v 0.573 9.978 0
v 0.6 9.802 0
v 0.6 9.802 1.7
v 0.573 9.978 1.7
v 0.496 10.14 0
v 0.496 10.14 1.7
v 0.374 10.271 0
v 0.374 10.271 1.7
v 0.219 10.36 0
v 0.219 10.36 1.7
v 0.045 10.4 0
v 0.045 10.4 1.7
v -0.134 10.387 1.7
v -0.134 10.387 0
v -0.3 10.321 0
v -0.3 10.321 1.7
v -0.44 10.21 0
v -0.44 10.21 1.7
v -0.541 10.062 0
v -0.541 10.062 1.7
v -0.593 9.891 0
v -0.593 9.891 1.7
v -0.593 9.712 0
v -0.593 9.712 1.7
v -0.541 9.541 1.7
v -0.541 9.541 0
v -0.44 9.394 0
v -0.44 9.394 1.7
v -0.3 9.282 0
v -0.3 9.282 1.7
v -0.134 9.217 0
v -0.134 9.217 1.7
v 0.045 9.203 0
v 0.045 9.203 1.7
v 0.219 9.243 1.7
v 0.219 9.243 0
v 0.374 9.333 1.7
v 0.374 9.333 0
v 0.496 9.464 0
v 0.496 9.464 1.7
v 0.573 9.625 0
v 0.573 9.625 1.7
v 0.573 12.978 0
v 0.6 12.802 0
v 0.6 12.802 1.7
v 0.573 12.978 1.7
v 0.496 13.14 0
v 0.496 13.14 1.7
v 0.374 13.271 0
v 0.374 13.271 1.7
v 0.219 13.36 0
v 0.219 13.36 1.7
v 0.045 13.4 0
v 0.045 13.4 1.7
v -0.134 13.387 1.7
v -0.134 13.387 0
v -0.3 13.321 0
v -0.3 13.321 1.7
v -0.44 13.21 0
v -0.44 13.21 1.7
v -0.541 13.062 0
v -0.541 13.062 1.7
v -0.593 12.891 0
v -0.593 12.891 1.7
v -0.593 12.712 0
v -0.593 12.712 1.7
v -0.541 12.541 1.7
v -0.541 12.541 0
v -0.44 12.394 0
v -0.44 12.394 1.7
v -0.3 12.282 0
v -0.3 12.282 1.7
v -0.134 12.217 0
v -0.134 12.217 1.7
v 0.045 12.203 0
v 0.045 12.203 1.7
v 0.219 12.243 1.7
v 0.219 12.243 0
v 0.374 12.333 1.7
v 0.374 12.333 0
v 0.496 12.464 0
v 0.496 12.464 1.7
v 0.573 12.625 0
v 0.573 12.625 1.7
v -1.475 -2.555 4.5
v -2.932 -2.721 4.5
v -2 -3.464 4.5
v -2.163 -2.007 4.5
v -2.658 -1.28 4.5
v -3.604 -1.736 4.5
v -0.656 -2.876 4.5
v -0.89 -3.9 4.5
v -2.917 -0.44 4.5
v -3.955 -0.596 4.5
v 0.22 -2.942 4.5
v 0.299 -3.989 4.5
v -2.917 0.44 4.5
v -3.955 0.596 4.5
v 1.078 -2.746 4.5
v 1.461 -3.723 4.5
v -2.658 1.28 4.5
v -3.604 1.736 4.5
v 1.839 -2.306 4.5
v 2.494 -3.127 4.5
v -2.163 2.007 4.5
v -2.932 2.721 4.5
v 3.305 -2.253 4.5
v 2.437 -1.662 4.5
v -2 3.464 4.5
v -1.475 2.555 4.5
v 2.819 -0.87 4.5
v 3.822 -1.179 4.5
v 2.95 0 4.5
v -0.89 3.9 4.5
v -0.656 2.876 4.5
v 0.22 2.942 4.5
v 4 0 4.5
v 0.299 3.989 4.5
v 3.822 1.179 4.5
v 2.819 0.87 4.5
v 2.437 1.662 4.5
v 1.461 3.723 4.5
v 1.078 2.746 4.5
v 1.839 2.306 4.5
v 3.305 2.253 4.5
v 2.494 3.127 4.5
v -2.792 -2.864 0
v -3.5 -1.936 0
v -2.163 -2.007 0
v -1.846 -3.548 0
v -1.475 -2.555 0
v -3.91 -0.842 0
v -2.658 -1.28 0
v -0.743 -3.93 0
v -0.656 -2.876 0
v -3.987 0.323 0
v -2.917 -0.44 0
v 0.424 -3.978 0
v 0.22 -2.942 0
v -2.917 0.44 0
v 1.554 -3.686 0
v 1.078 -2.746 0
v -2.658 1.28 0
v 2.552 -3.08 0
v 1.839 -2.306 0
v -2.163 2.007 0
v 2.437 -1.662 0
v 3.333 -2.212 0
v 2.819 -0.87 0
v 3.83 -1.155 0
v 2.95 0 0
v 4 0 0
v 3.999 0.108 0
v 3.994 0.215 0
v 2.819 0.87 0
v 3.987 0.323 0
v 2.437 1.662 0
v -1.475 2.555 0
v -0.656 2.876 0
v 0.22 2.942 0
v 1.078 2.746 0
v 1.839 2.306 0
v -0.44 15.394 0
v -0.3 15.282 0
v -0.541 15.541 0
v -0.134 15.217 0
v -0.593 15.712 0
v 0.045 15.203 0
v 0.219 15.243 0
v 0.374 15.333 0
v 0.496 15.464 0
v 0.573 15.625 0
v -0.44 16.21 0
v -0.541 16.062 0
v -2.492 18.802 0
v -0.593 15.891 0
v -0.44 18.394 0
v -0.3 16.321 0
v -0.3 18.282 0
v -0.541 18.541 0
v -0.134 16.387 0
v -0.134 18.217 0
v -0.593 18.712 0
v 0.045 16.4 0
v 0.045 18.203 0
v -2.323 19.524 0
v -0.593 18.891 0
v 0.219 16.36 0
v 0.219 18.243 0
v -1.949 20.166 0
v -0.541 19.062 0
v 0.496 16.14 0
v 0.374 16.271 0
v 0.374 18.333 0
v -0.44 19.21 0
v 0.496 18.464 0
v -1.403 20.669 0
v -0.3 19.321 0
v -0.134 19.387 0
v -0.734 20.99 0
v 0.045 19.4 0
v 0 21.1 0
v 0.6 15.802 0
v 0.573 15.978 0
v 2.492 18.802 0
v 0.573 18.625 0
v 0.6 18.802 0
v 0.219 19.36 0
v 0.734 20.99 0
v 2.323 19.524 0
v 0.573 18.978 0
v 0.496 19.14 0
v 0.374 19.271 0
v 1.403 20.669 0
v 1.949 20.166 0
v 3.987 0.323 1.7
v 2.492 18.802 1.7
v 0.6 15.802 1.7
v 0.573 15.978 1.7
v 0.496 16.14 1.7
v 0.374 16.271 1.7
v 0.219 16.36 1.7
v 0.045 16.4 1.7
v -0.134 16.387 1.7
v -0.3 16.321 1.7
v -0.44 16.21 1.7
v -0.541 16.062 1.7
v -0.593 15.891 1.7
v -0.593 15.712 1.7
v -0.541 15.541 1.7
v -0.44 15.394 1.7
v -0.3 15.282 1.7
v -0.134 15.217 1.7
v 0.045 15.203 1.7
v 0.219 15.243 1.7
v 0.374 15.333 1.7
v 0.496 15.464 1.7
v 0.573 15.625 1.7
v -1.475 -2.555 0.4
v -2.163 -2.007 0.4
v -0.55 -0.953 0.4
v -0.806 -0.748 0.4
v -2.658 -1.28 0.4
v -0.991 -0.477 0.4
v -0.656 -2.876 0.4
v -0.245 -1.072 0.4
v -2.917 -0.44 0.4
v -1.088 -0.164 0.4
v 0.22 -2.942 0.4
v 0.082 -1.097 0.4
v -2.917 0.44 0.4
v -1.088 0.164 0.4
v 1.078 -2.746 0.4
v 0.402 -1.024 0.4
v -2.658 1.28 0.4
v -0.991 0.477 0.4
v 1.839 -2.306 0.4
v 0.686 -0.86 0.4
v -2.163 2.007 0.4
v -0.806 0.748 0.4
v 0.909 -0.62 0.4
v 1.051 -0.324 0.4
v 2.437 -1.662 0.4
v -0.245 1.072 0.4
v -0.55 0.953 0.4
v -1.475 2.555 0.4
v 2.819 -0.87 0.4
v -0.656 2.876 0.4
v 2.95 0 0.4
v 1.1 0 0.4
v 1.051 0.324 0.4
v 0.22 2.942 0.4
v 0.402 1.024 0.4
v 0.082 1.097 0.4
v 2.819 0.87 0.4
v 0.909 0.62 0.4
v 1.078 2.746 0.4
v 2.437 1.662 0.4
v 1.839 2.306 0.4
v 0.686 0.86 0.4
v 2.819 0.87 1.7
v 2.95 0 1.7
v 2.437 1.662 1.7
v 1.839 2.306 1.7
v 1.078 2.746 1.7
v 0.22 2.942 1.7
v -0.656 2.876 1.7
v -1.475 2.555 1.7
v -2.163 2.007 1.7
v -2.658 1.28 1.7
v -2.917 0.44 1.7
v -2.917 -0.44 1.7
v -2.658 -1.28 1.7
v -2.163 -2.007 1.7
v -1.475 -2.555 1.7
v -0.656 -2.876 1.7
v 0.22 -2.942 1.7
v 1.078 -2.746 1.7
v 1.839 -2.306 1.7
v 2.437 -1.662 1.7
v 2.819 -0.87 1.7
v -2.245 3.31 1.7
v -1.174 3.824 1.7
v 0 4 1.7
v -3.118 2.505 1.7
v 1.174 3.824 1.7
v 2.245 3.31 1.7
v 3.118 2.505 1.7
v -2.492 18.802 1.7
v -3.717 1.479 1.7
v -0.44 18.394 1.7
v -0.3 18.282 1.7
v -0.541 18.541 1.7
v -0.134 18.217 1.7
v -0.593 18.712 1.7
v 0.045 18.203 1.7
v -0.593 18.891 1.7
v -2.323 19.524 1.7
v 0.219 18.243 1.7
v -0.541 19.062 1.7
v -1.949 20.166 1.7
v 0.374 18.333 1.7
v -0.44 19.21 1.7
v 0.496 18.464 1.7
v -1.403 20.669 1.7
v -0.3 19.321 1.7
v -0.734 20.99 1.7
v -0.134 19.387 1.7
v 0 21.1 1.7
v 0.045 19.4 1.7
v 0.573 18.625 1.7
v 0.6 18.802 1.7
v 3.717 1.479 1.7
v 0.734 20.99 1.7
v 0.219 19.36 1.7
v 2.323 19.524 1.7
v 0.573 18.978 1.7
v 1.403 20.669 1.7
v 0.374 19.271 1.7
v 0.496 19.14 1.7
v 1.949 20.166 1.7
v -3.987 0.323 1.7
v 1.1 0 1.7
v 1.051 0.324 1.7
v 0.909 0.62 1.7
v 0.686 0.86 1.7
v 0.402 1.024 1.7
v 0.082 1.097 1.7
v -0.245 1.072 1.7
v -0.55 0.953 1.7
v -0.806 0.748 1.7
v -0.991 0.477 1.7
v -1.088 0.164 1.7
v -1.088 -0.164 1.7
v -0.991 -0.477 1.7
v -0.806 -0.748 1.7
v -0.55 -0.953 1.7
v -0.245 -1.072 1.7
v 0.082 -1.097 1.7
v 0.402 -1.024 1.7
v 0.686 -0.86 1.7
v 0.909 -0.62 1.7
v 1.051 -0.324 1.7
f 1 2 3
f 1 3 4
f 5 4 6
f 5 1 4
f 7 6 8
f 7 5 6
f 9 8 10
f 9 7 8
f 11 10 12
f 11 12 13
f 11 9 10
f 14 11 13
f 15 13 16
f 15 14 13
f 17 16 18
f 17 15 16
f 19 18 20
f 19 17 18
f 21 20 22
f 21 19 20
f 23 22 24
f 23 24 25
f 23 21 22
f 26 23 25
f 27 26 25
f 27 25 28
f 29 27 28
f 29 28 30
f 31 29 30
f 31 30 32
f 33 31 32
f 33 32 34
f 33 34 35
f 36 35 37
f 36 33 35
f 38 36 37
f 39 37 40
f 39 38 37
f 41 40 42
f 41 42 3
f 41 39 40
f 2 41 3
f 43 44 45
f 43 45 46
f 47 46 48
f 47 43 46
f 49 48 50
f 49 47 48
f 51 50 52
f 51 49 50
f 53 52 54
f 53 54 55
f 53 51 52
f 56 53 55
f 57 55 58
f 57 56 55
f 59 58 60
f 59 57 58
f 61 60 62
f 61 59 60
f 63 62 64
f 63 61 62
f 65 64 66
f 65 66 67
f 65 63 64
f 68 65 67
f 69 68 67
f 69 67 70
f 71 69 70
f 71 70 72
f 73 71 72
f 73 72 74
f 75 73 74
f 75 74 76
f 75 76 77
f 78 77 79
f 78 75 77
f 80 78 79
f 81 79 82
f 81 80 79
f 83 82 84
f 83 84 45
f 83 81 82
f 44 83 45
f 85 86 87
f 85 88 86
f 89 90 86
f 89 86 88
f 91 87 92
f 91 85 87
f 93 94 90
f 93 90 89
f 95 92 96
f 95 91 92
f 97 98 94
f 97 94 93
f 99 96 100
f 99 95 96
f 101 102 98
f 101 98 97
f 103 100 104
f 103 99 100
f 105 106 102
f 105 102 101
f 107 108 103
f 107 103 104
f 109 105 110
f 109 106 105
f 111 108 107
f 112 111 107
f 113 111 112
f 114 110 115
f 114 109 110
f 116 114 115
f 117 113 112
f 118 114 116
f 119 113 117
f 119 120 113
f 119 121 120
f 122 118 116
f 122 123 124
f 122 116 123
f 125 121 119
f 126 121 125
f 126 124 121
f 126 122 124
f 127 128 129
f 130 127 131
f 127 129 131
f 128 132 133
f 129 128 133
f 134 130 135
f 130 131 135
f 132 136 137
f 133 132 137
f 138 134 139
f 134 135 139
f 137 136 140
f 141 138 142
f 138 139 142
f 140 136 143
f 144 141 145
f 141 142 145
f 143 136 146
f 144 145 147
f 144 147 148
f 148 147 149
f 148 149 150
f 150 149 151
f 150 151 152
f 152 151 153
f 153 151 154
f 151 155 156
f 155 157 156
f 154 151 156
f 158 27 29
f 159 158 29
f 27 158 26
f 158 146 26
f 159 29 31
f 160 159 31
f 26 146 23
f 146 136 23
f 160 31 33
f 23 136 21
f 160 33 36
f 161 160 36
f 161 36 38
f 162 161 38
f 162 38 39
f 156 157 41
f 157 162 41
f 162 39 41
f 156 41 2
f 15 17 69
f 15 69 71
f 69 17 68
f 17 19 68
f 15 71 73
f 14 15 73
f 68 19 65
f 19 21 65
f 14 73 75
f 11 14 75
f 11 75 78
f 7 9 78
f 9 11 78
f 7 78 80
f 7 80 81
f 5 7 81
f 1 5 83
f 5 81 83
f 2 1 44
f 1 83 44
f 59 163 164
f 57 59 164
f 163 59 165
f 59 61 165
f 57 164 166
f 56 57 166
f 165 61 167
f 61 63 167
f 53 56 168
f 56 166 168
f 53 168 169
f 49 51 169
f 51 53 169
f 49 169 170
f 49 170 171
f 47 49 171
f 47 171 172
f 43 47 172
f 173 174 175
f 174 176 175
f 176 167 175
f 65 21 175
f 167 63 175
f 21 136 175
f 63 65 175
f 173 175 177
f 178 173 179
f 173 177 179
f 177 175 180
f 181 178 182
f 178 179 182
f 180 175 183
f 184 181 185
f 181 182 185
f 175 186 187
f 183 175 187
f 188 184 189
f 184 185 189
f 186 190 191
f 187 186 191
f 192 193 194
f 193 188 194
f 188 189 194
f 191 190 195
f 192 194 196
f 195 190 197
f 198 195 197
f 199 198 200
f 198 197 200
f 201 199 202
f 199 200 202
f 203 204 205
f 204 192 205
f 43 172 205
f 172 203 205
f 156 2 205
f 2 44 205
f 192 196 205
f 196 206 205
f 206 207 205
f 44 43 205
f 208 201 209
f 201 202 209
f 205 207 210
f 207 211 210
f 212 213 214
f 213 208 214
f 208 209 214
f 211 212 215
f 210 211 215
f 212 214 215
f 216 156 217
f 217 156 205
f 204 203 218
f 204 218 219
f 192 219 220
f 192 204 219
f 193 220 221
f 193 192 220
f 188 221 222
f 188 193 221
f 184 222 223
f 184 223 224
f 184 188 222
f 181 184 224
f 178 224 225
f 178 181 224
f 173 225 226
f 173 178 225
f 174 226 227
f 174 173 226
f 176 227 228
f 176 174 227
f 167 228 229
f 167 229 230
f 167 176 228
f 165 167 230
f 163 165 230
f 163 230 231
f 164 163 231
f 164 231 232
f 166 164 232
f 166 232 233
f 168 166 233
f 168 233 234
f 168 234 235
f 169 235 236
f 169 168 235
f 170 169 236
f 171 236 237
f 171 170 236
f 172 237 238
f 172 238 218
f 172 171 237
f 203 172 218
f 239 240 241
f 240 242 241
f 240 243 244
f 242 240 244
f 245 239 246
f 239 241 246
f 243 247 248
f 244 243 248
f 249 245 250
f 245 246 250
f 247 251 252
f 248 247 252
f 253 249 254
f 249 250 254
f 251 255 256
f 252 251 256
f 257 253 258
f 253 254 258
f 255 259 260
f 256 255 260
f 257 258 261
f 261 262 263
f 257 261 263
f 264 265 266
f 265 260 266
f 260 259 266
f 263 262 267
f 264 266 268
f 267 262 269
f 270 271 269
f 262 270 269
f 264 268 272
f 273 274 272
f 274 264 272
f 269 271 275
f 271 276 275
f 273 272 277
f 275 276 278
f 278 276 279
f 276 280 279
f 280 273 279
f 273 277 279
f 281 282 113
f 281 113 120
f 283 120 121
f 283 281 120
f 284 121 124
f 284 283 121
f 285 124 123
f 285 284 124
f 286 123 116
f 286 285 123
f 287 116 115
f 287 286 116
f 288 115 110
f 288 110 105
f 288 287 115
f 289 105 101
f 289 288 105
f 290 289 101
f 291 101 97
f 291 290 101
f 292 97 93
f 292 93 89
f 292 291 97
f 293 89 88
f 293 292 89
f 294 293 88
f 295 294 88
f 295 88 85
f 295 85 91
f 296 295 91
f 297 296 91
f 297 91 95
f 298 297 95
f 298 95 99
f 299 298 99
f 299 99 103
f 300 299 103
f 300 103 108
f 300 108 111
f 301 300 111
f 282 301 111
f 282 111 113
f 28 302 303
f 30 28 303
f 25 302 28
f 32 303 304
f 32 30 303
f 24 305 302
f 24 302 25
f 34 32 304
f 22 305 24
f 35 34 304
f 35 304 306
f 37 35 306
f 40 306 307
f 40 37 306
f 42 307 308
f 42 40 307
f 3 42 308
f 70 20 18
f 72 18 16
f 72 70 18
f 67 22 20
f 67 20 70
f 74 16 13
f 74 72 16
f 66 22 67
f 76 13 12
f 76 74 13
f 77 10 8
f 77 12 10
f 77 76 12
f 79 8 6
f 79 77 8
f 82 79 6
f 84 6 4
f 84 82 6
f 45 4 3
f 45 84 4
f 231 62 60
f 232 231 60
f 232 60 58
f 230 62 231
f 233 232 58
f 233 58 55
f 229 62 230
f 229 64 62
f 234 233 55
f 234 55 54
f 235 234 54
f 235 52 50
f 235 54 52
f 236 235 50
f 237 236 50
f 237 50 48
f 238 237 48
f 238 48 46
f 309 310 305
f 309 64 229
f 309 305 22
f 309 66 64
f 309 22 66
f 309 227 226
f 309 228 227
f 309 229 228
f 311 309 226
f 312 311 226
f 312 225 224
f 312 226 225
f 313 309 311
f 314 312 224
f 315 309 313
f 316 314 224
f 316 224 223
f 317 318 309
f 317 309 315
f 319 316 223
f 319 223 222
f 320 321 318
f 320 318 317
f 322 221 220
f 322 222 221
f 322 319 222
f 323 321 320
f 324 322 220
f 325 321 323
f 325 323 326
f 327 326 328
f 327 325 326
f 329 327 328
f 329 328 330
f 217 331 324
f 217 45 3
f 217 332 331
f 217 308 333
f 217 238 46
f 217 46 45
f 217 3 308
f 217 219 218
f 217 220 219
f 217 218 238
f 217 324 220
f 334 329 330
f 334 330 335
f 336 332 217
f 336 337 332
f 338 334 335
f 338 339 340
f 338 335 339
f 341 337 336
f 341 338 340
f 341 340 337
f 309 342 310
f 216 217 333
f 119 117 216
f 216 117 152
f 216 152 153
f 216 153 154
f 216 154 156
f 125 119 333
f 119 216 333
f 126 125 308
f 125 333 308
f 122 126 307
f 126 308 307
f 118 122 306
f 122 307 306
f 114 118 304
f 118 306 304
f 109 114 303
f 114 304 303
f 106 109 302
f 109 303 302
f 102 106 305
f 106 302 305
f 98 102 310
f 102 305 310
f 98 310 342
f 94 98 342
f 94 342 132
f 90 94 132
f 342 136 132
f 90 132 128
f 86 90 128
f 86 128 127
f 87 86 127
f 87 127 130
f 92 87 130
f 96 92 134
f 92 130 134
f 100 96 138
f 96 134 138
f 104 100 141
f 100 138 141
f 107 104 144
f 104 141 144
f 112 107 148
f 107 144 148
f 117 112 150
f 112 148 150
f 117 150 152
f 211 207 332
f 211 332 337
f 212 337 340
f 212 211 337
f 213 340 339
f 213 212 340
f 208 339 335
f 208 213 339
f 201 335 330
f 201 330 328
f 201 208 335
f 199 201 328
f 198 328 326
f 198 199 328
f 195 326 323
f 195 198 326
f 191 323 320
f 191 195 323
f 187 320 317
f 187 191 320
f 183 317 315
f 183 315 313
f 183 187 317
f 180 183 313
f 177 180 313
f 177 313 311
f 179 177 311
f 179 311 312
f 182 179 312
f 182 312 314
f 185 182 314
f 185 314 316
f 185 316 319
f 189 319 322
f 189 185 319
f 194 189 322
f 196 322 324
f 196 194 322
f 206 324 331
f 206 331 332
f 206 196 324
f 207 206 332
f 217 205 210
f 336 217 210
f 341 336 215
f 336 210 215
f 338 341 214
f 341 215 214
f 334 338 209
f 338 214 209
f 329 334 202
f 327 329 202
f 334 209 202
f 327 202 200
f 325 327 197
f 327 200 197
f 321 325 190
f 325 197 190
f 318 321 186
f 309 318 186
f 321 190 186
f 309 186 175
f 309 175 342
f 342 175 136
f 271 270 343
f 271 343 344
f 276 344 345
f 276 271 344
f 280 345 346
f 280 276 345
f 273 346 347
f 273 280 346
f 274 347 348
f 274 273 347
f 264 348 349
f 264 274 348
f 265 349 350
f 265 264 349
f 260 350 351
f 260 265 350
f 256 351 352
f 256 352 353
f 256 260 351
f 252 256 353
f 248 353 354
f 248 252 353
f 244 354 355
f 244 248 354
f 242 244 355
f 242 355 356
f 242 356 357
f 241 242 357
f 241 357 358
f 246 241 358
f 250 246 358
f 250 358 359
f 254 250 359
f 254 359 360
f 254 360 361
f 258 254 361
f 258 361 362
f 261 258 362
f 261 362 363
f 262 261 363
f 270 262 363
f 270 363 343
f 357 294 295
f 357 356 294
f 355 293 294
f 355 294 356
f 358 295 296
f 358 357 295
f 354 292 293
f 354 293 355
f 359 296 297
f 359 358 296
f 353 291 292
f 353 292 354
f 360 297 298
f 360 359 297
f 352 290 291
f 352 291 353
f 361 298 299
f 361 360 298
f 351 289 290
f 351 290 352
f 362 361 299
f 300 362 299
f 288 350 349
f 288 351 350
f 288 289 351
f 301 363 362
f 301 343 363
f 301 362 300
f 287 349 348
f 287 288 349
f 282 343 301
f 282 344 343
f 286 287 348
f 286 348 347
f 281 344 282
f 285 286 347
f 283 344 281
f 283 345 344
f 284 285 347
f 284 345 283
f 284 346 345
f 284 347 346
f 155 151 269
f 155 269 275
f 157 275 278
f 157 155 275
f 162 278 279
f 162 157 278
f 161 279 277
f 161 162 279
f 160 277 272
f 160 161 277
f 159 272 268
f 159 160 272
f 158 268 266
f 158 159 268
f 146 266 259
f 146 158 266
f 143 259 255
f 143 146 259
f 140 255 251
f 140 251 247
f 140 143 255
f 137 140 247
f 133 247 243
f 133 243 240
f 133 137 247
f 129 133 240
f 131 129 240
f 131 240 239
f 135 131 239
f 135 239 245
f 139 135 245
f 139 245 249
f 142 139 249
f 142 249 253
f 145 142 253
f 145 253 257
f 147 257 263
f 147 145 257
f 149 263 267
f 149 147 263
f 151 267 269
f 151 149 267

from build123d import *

# Parameters (mm, degrees)
SKETCH_1_R          = 4
SKETCH_1_R_2        = 2.95
EXTRUDE_1_DEPTH     = 4.5
SKETCH_1_3_R        = 2.95
SKETCH_1_3_R_2      = 1.1
EXTRUDE_2_DEPTH     = 1.7
SKETCH_1_4_R        = 2.95
SKETCH_1_4_R_2      = 1.1
CUT_EXTRUDE_1_DEPTH = 0.4
SKETCH_2_R          = 0.6
EXTRUDE_3_DEPTH     = 1.7


with BuildPart() as part:
    # Эскиз1 → Бобышка-Вытянуть1 (new body)
    with BuildSketch(Plane.XY):
        Circle(SKETCH_1_R)
        Circle(SKETCH_1_R_2, mode=Mode.SUBTRACT)
    extrude(amount=EXTRUDE_1_DEPTH)

    # Эскиз1<3> → Бобышка-Вытянуть2 (add)
    with BuildSketch(Plane.XY):
        Circle(SKETCH_1_3_R)
        Circle(SKETCH_1_3_R_2, mode=Mode.SUBTRACT)
    extrude(amount=EXTRUDE_2_DEPTH)

    # Эскиз1<4> → Вырез-Вытянуть1 (cut)
    with BuildSketch(Plane.XY):
        Circle(SKETCH_1_4_R)
        Circle(SKETCH_1_4_R_2, mode=Mode.SUBTRACT)
    extrude(amount=CUT_EXTRUDE_1_DEPTH, mode=Mode.SUBTRACT)

    # Эскиз2 → Бобышка-Вытянуть3 (add)
    with BuildSketch(Plane.XY):
        with BuildLine():
            ThreePointArc((2.491857186, 18.801612903), (0, 21.1), (-2.491857186, 18.801612903))
            Line((-2.491857186, 18.801612903), (-3.986971498, 0.322580645))
            ThreePointArc((-3.986971498, 0.322580645), (0, 4), (3.986971498, 0.322580645))
            Line((3.986971498, 0.322580645), (2.491857186, 18.801612903))
        make_face()
        with Locations((0, 9.801612903)):
            Circle(SKETCH_2_R, mode=Mode.SUBTRACT)
        with Locations((0, 12.801612903)):
            Circle(SKETCH_2_R, mode=Mode.SUBTRACT)
        with Locations((0, 15.801612903)):
            Circle(SKETCH_2_R, mode=Mode.SUBTRACT)
        with Locations((0, 18.801612903)):
            Circle(SKETCH_2_R, mode=Mode.SUBTRACT)
    extrude(amount=EXTRUDE_3_DEPTH)


solid = part.part
